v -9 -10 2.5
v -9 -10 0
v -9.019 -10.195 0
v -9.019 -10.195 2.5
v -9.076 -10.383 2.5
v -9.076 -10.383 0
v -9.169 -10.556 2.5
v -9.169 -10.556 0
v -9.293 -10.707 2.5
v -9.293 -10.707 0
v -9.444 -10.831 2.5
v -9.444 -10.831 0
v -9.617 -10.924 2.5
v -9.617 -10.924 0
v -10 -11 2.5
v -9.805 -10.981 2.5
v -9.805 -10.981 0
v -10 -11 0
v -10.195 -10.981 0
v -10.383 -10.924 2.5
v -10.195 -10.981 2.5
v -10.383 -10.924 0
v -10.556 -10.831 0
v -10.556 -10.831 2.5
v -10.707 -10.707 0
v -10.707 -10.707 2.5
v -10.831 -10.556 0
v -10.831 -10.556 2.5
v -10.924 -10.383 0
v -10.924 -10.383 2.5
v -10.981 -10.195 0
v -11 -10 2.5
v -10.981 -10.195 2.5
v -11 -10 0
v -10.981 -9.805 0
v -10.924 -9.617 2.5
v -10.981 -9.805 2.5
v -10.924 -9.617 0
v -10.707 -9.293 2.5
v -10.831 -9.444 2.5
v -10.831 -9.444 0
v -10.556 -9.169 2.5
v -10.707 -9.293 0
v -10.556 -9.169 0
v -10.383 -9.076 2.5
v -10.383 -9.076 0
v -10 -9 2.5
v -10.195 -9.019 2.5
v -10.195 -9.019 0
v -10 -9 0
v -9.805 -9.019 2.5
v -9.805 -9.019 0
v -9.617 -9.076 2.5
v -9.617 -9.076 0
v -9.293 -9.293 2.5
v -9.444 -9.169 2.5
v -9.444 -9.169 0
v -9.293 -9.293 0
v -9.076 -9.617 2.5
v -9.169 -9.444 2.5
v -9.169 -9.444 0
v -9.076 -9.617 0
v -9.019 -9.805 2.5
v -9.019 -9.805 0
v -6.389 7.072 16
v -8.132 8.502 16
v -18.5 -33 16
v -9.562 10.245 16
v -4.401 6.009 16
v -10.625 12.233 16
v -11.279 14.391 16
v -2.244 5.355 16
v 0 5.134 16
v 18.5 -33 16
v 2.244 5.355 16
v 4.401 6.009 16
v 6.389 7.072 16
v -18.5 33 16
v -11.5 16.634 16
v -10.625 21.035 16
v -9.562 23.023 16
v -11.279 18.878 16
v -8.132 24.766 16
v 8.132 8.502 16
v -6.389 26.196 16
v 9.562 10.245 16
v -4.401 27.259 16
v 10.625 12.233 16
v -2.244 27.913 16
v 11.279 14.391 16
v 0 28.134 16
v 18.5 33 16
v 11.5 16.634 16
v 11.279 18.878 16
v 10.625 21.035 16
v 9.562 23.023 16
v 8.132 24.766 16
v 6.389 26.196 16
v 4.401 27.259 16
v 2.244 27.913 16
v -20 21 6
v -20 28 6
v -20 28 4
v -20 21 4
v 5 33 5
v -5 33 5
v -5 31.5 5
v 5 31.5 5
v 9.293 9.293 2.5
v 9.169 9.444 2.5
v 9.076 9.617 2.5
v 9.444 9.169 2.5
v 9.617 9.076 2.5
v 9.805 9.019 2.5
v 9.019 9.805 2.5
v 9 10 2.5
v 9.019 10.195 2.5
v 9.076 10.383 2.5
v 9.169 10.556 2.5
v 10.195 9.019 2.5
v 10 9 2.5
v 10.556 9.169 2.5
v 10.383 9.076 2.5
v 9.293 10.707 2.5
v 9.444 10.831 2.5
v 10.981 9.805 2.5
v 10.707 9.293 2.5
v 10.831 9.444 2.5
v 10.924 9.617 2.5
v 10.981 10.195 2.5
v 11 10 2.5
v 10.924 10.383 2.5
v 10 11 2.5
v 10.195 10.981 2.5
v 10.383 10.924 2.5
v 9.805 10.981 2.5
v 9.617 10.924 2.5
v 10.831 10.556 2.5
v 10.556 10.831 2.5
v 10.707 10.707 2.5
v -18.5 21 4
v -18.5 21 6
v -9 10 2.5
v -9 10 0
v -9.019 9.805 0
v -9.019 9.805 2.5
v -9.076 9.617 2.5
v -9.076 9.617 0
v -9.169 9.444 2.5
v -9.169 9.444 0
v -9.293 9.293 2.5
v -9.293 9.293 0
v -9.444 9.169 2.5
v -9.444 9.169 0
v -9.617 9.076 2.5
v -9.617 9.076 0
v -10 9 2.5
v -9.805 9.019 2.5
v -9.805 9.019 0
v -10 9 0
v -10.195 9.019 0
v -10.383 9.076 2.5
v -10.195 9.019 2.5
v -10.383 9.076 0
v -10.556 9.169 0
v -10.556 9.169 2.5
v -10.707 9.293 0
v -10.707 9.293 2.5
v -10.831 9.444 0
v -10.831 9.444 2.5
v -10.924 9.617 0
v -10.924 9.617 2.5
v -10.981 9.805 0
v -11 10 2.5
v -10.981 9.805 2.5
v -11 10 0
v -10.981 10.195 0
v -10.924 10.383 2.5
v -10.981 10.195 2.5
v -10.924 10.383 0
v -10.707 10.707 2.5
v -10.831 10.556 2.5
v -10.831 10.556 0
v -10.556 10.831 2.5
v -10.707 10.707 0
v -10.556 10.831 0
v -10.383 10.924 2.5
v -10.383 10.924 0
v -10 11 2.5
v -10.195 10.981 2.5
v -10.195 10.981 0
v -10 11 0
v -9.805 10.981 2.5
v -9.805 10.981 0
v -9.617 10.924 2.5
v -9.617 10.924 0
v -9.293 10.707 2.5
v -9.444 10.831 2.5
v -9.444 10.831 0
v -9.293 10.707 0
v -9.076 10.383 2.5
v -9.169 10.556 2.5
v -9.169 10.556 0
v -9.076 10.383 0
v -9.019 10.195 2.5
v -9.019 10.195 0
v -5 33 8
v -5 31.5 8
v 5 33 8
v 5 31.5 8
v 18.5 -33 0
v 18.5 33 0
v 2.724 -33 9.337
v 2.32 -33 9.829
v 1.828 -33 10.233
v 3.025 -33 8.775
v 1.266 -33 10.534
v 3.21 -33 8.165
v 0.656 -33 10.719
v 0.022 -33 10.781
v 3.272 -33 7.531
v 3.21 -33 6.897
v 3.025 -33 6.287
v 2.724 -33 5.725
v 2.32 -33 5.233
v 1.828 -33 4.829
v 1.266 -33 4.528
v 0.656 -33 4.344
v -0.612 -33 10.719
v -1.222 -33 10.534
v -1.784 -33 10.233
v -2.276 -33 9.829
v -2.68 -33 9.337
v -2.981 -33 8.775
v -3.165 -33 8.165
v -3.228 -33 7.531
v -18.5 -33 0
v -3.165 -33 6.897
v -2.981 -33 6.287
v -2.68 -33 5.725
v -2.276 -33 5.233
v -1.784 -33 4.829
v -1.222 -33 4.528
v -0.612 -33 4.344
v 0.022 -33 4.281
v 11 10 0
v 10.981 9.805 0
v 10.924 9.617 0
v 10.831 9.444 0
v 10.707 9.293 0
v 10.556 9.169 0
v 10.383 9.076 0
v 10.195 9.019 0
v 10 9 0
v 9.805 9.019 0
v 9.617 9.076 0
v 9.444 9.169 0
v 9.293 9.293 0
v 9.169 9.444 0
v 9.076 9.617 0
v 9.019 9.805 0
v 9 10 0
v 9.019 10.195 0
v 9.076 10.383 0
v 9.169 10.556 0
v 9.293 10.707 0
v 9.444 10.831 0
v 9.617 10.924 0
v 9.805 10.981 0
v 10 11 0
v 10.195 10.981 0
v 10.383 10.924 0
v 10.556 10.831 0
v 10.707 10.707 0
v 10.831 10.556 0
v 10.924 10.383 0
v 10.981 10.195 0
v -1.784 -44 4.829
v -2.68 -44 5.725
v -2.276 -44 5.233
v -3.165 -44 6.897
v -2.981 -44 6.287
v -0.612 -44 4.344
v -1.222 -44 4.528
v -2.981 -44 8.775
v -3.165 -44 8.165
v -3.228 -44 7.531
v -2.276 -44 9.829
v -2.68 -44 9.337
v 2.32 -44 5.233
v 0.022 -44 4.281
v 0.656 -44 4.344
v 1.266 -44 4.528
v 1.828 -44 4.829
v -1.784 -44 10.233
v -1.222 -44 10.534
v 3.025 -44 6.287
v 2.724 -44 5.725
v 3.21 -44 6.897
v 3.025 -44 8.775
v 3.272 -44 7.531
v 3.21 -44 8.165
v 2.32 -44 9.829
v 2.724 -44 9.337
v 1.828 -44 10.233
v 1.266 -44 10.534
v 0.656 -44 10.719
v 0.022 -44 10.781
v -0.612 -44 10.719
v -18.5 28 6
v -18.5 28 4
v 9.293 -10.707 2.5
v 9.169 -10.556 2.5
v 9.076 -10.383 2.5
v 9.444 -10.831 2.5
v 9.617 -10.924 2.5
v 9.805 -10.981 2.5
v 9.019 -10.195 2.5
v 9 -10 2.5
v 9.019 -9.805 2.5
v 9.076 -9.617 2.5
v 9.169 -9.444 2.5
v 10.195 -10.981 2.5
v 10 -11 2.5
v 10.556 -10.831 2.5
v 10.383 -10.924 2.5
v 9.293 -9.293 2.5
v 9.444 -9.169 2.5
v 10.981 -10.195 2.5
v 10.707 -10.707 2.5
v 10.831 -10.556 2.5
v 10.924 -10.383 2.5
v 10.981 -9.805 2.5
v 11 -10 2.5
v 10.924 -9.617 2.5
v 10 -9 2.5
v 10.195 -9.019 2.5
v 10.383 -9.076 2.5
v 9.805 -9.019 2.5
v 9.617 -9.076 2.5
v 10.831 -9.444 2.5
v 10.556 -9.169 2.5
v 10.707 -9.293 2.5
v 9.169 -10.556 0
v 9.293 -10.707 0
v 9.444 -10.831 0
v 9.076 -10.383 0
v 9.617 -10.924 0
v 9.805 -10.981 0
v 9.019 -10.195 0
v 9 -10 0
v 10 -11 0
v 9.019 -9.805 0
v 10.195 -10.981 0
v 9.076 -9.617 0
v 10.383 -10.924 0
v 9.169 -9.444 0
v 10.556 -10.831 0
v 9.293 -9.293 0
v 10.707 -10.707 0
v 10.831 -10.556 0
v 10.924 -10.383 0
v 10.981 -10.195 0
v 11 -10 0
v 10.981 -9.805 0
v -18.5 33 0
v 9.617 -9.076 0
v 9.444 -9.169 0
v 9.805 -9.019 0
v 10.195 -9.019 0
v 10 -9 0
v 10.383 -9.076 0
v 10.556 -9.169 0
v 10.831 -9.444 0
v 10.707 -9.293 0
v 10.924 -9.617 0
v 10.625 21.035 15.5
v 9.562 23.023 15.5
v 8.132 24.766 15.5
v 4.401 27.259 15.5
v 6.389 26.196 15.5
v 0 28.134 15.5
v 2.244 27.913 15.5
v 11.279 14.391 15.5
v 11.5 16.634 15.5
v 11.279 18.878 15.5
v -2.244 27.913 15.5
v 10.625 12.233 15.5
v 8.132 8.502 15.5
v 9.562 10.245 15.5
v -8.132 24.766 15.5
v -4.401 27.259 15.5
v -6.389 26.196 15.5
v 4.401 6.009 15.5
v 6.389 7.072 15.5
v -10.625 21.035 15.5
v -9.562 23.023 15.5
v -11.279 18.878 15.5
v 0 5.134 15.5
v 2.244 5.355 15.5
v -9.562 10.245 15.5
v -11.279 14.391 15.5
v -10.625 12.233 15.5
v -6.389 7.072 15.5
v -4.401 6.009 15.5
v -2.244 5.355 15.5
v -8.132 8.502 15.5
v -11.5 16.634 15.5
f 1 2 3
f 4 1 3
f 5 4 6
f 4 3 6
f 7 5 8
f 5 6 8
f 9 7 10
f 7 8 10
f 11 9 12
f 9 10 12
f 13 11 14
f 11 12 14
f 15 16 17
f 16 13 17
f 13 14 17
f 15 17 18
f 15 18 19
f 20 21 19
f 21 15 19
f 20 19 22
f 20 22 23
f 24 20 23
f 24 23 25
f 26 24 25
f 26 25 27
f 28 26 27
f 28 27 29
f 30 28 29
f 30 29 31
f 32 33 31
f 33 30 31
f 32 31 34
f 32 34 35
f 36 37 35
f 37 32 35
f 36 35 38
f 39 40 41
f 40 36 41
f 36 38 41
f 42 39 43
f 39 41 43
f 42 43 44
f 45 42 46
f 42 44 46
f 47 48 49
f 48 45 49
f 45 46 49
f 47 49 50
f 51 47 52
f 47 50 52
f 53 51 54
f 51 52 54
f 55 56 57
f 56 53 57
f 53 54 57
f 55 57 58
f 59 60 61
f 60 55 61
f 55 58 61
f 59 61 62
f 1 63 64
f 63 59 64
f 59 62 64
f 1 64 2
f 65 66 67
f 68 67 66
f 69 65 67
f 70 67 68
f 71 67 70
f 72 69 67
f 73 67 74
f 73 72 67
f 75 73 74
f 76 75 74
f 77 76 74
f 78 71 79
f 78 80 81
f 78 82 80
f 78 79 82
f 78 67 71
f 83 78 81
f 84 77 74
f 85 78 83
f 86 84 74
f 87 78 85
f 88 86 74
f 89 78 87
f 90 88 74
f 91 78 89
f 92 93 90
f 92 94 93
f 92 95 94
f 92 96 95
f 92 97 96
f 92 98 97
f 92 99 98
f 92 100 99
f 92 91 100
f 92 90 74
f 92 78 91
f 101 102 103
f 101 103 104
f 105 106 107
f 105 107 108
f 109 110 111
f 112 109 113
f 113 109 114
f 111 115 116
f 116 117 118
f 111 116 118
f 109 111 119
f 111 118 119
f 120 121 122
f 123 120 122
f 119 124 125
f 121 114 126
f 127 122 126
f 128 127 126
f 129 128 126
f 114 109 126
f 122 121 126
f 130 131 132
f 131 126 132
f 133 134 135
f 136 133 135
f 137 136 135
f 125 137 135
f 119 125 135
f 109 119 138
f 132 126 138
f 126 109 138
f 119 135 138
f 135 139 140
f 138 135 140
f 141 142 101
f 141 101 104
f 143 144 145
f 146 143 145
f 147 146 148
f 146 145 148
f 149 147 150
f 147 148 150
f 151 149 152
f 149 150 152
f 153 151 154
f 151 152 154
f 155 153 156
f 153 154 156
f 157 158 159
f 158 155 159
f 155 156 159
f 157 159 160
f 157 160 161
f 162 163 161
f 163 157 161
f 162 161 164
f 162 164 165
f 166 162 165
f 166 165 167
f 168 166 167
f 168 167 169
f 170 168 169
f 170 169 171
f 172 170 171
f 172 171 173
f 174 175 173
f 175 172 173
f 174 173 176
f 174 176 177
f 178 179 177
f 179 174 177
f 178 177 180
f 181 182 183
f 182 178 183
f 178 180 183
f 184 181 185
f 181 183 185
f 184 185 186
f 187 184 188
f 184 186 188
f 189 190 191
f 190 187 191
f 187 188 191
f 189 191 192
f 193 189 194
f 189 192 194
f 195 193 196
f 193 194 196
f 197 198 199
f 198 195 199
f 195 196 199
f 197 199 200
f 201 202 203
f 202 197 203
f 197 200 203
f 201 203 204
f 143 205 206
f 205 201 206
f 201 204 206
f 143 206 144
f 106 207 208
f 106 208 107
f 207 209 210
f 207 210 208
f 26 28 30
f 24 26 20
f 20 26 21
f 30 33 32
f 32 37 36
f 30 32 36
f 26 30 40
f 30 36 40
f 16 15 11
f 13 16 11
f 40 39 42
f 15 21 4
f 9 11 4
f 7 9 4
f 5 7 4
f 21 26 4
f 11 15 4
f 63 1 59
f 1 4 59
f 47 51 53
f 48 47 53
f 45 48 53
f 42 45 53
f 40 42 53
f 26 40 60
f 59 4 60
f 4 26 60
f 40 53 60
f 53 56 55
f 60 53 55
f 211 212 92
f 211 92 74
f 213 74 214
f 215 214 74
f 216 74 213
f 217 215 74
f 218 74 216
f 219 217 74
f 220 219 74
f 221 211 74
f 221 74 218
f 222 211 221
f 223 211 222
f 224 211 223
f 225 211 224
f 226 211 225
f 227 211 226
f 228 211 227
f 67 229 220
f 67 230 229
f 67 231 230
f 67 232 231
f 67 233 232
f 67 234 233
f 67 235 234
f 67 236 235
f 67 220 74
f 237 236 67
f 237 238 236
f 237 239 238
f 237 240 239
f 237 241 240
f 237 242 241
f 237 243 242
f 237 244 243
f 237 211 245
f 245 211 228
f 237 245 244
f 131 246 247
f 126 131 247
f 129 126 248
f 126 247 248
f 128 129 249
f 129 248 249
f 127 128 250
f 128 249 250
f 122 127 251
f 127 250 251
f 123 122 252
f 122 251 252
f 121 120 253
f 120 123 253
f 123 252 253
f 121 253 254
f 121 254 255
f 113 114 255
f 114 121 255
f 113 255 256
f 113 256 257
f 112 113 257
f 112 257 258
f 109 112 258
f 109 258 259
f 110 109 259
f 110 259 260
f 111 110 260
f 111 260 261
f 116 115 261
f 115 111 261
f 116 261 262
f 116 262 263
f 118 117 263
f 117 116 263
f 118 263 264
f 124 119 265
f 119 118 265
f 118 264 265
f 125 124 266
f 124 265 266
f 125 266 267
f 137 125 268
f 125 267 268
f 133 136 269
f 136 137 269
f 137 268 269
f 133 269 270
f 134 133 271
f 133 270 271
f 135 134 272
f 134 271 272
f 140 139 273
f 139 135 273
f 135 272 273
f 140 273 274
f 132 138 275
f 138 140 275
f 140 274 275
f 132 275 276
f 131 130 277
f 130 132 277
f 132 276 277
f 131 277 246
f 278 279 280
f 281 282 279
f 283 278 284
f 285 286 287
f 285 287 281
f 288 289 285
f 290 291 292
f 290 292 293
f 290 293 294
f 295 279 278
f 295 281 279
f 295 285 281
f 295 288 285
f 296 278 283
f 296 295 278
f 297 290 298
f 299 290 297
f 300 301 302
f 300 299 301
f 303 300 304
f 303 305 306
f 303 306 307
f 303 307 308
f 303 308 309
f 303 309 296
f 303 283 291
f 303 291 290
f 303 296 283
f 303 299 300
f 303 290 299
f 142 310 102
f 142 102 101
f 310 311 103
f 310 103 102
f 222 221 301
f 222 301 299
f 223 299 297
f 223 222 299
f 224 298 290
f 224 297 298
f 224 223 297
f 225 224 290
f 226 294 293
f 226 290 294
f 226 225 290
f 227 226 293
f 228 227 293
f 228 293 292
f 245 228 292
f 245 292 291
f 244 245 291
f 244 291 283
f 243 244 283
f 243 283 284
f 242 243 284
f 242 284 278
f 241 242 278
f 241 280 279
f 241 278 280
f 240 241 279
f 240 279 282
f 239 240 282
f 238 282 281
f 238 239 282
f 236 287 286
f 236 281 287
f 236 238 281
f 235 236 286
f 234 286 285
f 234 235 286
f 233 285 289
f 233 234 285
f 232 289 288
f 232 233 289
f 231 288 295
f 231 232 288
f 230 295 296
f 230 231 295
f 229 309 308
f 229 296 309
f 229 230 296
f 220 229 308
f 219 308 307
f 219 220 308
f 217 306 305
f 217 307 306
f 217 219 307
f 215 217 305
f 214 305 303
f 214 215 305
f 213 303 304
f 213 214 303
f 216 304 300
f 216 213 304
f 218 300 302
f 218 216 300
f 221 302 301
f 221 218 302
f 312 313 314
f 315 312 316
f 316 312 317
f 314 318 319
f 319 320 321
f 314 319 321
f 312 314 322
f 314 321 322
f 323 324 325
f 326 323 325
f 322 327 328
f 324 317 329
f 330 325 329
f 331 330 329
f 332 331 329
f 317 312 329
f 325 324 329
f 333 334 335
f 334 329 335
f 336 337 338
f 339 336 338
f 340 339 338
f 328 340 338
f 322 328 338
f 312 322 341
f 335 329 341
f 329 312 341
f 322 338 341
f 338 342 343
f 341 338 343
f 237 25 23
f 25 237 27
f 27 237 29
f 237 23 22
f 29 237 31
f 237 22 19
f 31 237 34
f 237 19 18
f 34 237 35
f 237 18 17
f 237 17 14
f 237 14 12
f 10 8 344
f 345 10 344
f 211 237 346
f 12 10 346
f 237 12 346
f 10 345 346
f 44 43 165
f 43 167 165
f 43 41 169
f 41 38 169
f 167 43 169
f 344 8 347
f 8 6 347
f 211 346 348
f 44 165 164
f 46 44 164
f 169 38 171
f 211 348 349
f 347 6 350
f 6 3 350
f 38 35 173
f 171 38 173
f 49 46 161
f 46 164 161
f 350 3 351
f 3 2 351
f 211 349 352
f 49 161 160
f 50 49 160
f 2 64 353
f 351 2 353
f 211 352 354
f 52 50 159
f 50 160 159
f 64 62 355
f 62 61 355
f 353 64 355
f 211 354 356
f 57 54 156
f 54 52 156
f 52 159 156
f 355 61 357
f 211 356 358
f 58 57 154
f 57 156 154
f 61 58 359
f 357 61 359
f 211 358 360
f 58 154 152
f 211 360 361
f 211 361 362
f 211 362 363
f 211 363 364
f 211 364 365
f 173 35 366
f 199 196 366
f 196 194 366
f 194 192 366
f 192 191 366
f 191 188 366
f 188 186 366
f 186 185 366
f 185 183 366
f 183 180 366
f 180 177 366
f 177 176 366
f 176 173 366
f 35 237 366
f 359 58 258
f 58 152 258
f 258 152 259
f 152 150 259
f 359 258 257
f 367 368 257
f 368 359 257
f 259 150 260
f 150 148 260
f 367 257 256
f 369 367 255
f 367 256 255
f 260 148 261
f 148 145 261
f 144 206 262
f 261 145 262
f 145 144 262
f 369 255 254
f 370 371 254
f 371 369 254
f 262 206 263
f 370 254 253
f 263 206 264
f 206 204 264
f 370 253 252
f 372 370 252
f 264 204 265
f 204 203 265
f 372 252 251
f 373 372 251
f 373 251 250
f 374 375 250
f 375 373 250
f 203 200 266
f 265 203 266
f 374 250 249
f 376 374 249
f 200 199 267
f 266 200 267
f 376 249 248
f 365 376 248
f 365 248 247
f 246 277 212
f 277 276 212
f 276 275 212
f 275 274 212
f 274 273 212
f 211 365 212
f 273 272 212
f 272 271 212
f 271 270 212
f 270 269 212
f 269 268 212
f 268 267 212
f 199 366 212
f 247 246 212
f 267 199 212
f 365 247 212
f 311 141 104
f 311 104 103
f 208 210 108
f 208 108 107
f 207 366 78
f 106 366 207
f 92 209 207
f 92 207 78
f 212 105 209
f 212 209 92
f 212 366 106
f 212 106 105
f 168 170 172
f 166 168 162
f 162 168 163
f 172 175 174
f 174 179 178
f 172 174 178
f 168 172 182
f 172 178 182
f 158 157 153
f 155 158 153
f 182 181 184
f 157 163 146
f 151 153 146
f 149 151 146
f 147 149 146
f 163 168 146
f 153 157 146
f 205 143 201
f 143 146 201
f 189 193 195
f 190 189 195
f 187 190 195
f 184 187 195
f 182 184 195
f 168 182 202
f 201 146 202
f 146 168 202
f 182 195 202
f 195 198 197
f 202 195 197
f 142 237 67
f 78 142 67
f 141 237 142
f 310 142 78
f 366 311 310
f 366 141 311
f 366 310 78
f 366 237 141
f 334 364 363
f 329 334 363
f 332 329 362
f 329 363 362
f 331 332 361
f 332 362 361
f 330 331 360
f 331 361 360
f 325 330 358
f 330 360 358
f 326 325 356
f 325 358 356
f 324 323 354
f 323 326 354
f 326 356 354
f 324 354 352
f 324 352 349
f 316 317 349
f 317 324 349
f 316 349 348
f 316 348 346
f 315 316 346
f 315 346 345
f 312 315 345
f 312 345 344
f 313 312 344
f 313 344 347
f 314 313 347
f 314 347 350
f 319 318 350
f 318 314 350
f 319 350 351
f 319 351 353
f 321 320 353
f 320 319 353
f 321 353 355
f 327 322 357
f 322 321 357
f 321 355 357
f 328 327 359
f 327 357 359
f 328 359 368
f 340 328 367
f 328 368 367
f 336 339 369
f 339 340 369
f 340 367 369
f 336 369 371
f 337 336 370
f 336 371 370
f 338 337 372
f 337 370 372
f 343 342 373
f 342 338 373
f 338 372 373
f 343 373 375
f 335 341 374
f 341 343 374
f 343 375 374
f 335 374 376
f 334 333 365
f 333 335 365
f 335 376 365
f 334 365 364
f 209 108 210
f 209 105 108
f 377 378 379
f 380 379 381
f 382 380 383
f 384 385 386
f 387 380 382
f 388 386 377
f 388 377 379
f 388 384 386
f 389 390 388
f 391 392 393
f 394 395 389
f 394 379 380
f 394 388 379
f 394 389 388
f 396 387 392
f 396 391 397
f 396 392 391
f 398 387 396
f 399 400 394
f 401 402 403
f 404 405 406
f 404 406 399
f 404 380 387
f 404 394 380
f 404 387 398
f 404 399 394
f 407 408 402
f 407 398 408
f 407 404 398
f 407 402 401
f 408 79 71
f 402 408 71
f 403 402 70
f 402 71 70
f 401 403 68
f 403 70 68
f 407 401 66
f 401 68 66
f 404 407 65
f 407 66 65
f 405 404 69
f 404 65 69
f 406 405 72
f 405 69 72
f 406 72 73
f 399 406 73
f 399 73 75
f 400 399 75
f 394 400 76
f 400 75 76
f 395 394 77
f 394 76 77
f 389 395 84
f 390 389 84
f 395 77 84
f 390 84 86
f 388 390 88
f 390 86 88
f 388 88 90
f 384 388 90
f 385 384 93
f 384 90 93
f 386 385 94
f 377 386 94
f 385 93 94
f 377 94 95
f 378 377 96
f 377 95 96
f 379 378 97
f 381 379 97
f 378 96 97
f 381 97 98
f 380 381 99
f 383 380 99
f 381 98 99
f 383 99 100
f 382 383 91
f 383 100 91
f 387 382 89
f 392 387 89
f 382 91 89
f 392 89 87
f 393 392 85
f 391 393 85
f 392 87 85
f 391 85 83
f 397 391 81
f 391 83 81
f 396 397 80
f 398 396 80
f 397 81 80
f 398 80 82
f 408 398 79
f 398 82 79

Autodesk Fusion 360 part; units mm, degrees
sketch "Sketch1" plane through (0, 0, 0) normal (0, 0, 1) x (1, 0, 0)
  line L0 (-18.5, 33) -> (18.5, 33)
  line L1 (18.5, 33) -> (18.5, -33)
  line L2 (18.5, -33) -> (-18.5, -33)
  line L3 (-18.5, -33) -> (-18.5, 33)
  line L4 (-18.5, 33) -> (18.5, -33) construction
  line L5 (18.5, 33) -> (-18.5, -33) construction
  dimension "d1" = 37
  dimension "d2" = 66
extrude "Extrude1" add sketch "Sketch1" along normal blind 16 makes body 1
sketch "Sketch2" plane through (0, 0, 0) normal (0, 0, 1) x (1, 0, 0)
  line L0 (10, -10) -> (-10, -10) construction
  line L1 (-10, -10) -> (-10, 10) construction
  line L2 (-10, 10) -> (10, 10) construction
  line L3 (10, 10) -> (10, -10) construction
  line L4 (10, -10) -> (-10, 10) construction
  line L5 (-10, -10) -> (10, 10) construction
  circle A0 centre (10, 10) radius 1
  circle A1 centre (10, -10) radius 1
  circle A2 centre (-10, 10) radius 1
  circle A3 centre (-10, -10) radius 1
  dimension "d5" = 2
  dimension "d6" = 2
  dimension "d7" = 2
  dimension "d8" = 2
extrude "Extrude2" cut sketch "Sketch2" along normal blind 2.5 bodies 1
sketch "Sketch3" plane through (0, -33, 0) normal (0, -1, 0) x (1, 0, 0)
  line L0 (-18.5, 0) -> (18.5, 0)
  line L1 (18.5, 0) -> (18.5, 16)
  line L2 (18.5, 16) -> (-18.5, 16)
  line L3 (-18.5, 16) -> (-18.5, 0)
  circle A0 centre (0, 7.5245) radius 3.25
  dimension "d11" = 6.5
sketch "Sketch4" plane through (0, -33, 0) normal (0, -1, 0) x (1, 0, 0)
  line L0 (-18.5, 0) -> (18.5, 0)
  line L1 (18.5, 0) -> (18.5, 16)
  line L2 (18.5, 16) -> (-18.5, 16)
  line L3 (-18.5, 16) -> (-18.5, 0)
  circle A0 centre (0.0221, 7.5311) radius 3.25
  dimension "d12" = 6.5
extrude "Extrude3" add sketch "Sketch4" along normal blind 11 contours A0 bodies 1
sketch "Sketch5" plane through (0, 0, 16) normal (0, 0, 1) x (-1, 0, 0)
  line L0 (18.5, 33) -> (-18.5, 33)
  line L1 (-18.5, 33) -> (-18.5, -33)
  line L2 (-18.5, -33) -> (18.5, -33)
  line L3 (18.5, -33) -> (18.5, 33)
  circle A0 centre (0, -16.6341) radius 11.5
  dimension "d15" = 23
extrude "Extrude4" cut sketch "Sketch5" against normal blind 0.5 contours A0 bodies 1
sketch "Sketch6" plane through (-18.5, 0, 0) normal (-1, 0, 0) x (0, -1, 0)
  line L0 (-33, 0) -> (33, 0)
  line L1 (33, 0) -> (33, 16)
  line L2 (33, 16) -> (-33, 16)
  line L3 (-33, 16) -> (-33, 0)
  line L4 (-28, 6) -> (-21, 6)
  line L5 (-21, 6) -> (-21, 4)
  line L6 (-21, 4) -> (-28, 4)
  line L7 (-28, 4) -> (-28, 6)
extrude "Extrude5" add sketch "Sketch6" along normal blind 1.5 separate body contours L4 L5 L6 L7 makes body 2
sketch "Sketch7" plane through (0, 33, 0) normal (0, 1, 0) x (-1, 0, 0)
  line L0 (-18.5, 0) -> (18.5, 0)
  line L1 (18.5, 0) -> (18.5, 16)
  line L2 (18.5, 16) -> (-18.5, 16)
  line L3 (-18.5, 16) -> (-18.5, 0)
  line L4 (-5, 8) -> (5, 8)
  line L5 (5, 8) -> (5, 5)
  line L6 (5, 5) -> (-5, 5)
  line L7 (-5, 5) -> (-5, 8)
extrude "Extrude6" cut sketch "Sketch7" against normal blind 1.5 contours L4 L5 L6 L7 bodies 1
combine "Combine1" operation add target body 1 tool bodies 2
